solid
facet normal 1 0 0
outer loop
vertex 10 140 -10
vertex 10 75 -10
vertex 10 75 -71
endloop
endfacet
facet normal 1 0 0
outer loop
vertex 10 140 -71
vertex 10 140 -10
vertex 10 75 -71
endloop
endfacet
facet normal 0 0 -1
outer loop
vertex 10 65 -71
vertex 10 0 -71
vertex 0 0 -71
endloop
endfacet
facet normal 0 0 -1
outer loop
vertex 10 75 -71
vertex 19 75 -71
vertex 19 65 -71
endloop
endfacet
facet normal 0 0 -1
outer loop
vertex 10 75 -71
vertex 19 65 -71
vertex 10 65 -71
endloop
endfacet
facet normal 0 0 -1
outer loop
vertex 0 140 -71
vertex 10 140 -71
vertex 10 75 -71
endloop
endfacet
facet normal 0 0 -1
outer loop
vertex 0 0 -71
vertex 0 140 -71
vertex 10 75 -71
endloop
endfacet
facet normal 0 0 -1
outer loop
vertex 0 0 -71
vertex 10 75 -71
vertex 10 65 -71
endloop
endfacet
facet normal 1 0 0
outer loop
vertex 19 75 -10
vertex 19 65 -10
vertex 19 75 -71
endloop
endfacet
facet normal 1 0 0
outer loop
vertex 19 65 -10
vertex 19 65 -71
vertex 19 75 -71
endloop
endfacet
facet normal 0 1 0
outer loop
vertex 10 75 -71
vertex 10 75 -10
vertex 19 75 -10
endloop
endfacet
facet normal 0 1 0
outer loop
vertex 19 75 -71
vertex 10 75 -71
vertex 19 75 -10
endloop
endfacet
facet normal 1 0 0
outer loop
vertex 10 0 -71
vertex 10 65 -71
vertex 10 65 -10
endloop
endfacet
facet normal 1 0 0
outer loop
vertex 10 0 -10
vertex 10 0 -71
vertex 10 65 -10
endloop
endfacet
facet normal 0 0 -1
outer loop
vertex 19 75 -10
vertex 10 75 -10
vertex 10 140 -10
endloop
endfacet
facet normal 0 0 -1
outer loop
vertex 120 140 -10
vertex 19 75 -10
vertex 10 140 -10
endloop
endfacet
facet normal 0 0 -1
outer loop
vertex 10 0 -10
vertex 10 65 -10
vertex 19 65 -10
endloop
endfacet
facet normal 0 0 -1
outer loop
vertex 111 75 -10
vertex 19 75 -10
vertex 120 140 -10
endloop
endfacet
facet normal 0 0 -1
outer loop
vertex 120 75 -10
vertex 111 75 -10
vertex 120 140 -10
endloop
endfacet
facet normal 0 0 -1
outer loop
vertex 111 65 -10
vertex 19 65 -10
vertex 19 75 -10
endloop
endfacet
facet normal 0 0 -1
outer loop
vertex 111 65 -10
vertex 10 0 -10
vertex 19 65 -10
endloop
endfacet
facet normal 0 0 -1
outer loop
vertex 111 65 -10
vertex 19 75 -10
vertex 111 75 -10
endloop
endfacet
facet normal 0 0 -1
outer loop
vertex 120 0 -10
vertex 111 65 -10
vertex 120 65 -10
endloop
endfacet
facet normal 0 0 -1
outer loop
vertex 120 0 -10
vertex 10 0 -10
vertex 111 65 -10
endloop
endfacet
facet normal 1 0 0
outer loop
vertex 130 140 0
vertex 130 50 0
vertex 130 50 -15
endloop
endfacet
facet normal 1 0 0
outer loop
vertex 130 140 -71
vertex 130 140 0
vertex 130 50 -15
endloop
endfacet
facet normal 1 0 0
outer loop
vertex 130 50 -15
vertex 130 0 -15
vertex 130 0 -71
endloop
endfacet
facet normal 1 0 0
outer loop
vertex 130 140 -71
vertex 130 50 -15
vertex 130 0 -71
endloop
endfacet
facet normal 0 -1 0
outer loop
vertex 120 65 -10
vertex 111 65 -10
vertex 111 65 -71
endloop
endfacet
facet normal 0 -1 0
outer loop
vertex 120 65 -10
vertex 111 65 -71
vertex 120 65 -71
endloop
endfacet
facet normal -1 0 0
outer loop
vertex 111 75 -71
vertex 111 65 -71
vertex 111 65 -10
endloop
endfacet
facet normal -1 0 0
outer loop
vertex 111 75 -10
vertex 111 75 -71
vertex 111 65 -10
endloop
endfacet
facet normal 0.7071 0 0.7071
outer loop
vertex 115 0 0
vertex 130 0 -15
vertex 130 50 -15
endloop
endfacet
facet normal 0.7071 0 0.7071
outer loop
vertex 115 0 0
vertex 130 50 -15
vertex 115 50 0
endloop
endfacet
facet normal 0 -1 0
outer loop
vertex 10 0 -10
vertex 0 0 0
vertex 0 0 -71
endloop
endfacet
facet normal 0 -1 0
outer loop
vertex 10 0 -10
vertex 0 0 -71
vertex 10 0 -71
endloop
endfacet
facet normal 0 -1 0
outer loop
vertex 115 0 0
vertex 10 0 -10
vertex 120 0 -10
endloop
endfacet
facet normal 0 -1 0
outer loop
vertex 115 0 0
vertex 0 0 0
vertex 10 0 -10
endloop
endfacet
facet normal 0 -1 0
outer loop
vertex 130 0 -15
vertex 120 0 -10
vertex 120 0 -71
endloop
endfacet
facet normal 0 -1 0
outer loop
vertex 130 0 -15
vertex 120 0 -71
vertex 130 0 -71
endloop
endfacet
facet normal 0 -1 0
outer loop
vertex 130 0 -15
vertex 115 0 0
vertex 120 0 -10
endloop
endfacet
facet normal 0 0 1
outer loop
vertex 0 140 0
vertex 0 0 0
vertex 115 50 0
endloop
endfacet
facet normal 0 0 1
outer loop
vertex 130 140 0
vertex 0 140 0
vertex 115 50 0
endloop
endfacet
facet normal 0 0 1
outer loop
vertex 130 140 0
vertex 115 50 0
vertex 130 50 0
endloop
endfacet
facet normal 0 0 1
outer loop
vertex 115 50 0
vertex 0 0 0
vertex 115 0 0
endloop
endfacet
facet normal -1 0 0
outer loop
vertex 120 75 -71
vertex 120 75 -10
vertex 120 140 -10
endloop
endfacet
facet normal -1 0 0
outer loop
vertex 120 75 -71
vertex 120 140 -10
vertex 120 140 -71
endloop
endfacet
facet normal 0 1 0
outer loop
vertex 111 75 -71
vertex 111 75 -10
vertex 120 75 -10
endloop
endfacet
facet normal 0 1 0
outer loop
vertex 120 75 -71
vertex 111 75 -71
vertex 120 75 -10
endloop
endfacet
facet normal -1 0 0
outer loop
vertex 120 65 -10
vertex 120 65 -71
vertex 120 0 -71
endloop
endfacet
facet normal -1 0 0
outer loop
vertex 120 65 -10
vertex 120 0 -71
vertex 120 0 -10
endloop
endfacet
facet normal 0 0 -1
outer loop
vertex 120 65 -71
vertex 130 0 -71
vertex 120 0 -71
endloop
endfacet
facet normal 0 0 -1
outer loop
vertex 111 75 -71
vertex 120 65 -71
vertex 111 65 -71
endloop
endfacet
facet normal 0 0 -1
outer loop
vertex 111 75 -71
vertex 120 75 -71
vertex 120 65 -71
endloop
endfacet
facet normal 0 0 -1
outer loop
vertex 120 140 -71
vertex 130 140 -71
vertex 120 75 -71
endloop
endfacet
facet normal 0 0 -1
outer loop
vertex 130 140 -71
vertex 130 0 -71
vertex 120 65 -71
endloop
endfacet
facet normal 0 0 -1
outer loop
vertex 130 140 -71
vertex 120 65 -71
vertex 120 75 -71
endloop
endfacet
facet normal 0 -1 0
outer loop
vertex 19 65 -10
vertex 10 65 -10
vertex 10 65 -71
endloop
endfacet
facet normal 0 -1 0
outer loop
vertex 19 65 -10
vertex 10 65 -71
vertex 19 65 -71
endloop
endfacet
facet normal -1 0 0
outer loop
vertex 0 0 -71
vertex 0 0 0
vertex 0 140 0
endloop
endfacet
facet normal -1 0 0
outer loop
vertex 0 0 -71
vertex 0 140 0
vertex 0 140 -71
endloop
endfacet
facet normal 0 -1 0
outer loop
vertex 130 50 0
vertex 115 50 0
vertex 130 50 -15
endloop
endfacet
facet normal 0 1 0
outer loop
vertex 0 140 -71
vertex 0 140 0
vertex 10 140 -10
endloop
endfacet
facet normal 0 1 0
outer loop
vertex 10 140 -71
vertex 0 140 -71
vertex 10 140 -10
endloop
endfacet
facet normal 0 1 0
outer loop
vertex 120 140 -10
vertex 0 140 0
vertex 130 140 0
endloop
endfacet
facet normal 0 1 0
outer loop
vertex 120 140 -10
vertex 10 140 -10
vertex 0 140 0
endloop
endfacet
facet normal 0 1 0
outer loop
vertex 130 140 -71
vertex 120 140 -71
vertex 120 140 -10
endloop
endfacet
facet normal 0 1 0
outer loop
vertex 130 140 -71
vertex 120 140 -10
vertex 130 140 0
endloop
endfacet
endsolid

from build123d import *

# Parameters (mm, degrees)
SKETCH1_W           = 130
SKETCH1_H           = 90
BOSS_EXTRUDE1_DEPTH = 140
SKETCH3_W           = 110
SKETCH3_H           = 70
CUT_EXTRUDE1_DEPTH  = 212.187120819
SKETCH4_W           = 110
SKETCH4_H           = 70
SKETCH4_W_2         = 92
SKETCH4_H_2         = 52
BOSS_EXTRUDE2_DEPTH = 75
SKETCH5_W           = 110
SKETCH5_H           = 70
SKETCH5_W_2         = 92
SKETCH5_H_2         = 52
CUT_EXTRUDE2_DEPTH  = 65
SKETCH6_W           = 130
SKETCH6_H           = 140
CUT_EXTRUDE3_DEPTH  = 19
SKETCH7_W           = 92
SKETCH7_H           = 10
CUT_EXTRUDE4_DEPTH  = 9
CUT_EXTRUDE5_DEPTH  = 50


with BuildPart() as part:
    # Sketch1 → Boss-Extrude1 (new body)
    with BuildSketch(Plane(origin=(0, 0, 0), x_dir=(1, 0, 0), z_dir=(0, 1, 0))):
        with Locations((65, 45)):
            Rectangle(SKETCH1_W, SKETCH1_H)
    extrude(amount=BOSS_EXTRUDE1_DEPTH)

    # Sketch3 → Cut-Extrude1 (cut, through all)
    with BuildSketch(Plane(origin=(0, 140, 0), x_dir=(1, 0, 0), z_dir=(0, 1, 0))):
        with Locations((65, 45)):
            Rectangle(SKETCH3_W, SKETCH3_H)
    extrude(amount=-CUT_EXTRUDE1_DEPTH, mode=Mode.SUBTRACT)

    # Sketch4 → Boss-Extrude2 (add)
    with BuildSketch(Plane.XZ):
        with Locations((65, -45)):
            Rectangle(SKETCH4_W, SKETCH4_H)
        with Locations((65, -45)):
            Rectangle(SKETCH4_W_2, SKETCH4_H_2, mode=Mode.SUBTRACT)
    extrude(amount=-BOSS_EXTRUDE2_DEPTH)

    # Sketch5 → Cut-Extrude2 (cut)
    with BuildSketch(Plane.XZ):
        with Locations((65, -45)):
            Rectangle(SKETCH5_W, SKETCH5_H)
        with Locations((65, -45)):
            Rectangle(SKETCH5_W_2, SKETCH5_H_2, mode=Mode.SUBTRACT)
    extrude(amount=-CUT_EXTRUDE2_DEPTH, mode=Mode.SUBTRACT)

    # Sketch6 → Cut-Extrude3 (cut)
    with BuildSketch(Plane(origin=(0, 0, -90), x_dir=(-1, 0, 0), z_dir=(0, 0, -1))):
        with Locations((-65, 70)):
            Rectangle(SKETCH6_W, SKETCH6_H)
    extrude(amount=-CUT_EXTRUDE3_DEPTH, mode=Mode.SUBTRACT)

    # Sketch7 → Cut-Extrude4 (cut)
    with BuildSketch(Plane(origin=(0, 0, -19), x_dir=(-1, 0, 0), z_dir=(0, 0, -1))):
        with Locations((-65, 70)):
            Rectangle(SKETCH7_W, SKETCH7_H)
    extrude(amount=-CUT_EXTRUDE4_DEPTH, mode=Mode.SUBTRACT)

    # Sketch8 → Cut-Extrude5 (cut)
    with BuildSketch(Plane(origin=(0, 0, 0), x_dir=(1, 0, 0), z_dir=(0, 1, 0))):
        Polygon((130, 0), (130, 15), (115, 0), align=None)
    extrude(amount=CUT_EXTRUDE5_DEPTH, mode=Mode.SUBTRACT)


solid = part.part
